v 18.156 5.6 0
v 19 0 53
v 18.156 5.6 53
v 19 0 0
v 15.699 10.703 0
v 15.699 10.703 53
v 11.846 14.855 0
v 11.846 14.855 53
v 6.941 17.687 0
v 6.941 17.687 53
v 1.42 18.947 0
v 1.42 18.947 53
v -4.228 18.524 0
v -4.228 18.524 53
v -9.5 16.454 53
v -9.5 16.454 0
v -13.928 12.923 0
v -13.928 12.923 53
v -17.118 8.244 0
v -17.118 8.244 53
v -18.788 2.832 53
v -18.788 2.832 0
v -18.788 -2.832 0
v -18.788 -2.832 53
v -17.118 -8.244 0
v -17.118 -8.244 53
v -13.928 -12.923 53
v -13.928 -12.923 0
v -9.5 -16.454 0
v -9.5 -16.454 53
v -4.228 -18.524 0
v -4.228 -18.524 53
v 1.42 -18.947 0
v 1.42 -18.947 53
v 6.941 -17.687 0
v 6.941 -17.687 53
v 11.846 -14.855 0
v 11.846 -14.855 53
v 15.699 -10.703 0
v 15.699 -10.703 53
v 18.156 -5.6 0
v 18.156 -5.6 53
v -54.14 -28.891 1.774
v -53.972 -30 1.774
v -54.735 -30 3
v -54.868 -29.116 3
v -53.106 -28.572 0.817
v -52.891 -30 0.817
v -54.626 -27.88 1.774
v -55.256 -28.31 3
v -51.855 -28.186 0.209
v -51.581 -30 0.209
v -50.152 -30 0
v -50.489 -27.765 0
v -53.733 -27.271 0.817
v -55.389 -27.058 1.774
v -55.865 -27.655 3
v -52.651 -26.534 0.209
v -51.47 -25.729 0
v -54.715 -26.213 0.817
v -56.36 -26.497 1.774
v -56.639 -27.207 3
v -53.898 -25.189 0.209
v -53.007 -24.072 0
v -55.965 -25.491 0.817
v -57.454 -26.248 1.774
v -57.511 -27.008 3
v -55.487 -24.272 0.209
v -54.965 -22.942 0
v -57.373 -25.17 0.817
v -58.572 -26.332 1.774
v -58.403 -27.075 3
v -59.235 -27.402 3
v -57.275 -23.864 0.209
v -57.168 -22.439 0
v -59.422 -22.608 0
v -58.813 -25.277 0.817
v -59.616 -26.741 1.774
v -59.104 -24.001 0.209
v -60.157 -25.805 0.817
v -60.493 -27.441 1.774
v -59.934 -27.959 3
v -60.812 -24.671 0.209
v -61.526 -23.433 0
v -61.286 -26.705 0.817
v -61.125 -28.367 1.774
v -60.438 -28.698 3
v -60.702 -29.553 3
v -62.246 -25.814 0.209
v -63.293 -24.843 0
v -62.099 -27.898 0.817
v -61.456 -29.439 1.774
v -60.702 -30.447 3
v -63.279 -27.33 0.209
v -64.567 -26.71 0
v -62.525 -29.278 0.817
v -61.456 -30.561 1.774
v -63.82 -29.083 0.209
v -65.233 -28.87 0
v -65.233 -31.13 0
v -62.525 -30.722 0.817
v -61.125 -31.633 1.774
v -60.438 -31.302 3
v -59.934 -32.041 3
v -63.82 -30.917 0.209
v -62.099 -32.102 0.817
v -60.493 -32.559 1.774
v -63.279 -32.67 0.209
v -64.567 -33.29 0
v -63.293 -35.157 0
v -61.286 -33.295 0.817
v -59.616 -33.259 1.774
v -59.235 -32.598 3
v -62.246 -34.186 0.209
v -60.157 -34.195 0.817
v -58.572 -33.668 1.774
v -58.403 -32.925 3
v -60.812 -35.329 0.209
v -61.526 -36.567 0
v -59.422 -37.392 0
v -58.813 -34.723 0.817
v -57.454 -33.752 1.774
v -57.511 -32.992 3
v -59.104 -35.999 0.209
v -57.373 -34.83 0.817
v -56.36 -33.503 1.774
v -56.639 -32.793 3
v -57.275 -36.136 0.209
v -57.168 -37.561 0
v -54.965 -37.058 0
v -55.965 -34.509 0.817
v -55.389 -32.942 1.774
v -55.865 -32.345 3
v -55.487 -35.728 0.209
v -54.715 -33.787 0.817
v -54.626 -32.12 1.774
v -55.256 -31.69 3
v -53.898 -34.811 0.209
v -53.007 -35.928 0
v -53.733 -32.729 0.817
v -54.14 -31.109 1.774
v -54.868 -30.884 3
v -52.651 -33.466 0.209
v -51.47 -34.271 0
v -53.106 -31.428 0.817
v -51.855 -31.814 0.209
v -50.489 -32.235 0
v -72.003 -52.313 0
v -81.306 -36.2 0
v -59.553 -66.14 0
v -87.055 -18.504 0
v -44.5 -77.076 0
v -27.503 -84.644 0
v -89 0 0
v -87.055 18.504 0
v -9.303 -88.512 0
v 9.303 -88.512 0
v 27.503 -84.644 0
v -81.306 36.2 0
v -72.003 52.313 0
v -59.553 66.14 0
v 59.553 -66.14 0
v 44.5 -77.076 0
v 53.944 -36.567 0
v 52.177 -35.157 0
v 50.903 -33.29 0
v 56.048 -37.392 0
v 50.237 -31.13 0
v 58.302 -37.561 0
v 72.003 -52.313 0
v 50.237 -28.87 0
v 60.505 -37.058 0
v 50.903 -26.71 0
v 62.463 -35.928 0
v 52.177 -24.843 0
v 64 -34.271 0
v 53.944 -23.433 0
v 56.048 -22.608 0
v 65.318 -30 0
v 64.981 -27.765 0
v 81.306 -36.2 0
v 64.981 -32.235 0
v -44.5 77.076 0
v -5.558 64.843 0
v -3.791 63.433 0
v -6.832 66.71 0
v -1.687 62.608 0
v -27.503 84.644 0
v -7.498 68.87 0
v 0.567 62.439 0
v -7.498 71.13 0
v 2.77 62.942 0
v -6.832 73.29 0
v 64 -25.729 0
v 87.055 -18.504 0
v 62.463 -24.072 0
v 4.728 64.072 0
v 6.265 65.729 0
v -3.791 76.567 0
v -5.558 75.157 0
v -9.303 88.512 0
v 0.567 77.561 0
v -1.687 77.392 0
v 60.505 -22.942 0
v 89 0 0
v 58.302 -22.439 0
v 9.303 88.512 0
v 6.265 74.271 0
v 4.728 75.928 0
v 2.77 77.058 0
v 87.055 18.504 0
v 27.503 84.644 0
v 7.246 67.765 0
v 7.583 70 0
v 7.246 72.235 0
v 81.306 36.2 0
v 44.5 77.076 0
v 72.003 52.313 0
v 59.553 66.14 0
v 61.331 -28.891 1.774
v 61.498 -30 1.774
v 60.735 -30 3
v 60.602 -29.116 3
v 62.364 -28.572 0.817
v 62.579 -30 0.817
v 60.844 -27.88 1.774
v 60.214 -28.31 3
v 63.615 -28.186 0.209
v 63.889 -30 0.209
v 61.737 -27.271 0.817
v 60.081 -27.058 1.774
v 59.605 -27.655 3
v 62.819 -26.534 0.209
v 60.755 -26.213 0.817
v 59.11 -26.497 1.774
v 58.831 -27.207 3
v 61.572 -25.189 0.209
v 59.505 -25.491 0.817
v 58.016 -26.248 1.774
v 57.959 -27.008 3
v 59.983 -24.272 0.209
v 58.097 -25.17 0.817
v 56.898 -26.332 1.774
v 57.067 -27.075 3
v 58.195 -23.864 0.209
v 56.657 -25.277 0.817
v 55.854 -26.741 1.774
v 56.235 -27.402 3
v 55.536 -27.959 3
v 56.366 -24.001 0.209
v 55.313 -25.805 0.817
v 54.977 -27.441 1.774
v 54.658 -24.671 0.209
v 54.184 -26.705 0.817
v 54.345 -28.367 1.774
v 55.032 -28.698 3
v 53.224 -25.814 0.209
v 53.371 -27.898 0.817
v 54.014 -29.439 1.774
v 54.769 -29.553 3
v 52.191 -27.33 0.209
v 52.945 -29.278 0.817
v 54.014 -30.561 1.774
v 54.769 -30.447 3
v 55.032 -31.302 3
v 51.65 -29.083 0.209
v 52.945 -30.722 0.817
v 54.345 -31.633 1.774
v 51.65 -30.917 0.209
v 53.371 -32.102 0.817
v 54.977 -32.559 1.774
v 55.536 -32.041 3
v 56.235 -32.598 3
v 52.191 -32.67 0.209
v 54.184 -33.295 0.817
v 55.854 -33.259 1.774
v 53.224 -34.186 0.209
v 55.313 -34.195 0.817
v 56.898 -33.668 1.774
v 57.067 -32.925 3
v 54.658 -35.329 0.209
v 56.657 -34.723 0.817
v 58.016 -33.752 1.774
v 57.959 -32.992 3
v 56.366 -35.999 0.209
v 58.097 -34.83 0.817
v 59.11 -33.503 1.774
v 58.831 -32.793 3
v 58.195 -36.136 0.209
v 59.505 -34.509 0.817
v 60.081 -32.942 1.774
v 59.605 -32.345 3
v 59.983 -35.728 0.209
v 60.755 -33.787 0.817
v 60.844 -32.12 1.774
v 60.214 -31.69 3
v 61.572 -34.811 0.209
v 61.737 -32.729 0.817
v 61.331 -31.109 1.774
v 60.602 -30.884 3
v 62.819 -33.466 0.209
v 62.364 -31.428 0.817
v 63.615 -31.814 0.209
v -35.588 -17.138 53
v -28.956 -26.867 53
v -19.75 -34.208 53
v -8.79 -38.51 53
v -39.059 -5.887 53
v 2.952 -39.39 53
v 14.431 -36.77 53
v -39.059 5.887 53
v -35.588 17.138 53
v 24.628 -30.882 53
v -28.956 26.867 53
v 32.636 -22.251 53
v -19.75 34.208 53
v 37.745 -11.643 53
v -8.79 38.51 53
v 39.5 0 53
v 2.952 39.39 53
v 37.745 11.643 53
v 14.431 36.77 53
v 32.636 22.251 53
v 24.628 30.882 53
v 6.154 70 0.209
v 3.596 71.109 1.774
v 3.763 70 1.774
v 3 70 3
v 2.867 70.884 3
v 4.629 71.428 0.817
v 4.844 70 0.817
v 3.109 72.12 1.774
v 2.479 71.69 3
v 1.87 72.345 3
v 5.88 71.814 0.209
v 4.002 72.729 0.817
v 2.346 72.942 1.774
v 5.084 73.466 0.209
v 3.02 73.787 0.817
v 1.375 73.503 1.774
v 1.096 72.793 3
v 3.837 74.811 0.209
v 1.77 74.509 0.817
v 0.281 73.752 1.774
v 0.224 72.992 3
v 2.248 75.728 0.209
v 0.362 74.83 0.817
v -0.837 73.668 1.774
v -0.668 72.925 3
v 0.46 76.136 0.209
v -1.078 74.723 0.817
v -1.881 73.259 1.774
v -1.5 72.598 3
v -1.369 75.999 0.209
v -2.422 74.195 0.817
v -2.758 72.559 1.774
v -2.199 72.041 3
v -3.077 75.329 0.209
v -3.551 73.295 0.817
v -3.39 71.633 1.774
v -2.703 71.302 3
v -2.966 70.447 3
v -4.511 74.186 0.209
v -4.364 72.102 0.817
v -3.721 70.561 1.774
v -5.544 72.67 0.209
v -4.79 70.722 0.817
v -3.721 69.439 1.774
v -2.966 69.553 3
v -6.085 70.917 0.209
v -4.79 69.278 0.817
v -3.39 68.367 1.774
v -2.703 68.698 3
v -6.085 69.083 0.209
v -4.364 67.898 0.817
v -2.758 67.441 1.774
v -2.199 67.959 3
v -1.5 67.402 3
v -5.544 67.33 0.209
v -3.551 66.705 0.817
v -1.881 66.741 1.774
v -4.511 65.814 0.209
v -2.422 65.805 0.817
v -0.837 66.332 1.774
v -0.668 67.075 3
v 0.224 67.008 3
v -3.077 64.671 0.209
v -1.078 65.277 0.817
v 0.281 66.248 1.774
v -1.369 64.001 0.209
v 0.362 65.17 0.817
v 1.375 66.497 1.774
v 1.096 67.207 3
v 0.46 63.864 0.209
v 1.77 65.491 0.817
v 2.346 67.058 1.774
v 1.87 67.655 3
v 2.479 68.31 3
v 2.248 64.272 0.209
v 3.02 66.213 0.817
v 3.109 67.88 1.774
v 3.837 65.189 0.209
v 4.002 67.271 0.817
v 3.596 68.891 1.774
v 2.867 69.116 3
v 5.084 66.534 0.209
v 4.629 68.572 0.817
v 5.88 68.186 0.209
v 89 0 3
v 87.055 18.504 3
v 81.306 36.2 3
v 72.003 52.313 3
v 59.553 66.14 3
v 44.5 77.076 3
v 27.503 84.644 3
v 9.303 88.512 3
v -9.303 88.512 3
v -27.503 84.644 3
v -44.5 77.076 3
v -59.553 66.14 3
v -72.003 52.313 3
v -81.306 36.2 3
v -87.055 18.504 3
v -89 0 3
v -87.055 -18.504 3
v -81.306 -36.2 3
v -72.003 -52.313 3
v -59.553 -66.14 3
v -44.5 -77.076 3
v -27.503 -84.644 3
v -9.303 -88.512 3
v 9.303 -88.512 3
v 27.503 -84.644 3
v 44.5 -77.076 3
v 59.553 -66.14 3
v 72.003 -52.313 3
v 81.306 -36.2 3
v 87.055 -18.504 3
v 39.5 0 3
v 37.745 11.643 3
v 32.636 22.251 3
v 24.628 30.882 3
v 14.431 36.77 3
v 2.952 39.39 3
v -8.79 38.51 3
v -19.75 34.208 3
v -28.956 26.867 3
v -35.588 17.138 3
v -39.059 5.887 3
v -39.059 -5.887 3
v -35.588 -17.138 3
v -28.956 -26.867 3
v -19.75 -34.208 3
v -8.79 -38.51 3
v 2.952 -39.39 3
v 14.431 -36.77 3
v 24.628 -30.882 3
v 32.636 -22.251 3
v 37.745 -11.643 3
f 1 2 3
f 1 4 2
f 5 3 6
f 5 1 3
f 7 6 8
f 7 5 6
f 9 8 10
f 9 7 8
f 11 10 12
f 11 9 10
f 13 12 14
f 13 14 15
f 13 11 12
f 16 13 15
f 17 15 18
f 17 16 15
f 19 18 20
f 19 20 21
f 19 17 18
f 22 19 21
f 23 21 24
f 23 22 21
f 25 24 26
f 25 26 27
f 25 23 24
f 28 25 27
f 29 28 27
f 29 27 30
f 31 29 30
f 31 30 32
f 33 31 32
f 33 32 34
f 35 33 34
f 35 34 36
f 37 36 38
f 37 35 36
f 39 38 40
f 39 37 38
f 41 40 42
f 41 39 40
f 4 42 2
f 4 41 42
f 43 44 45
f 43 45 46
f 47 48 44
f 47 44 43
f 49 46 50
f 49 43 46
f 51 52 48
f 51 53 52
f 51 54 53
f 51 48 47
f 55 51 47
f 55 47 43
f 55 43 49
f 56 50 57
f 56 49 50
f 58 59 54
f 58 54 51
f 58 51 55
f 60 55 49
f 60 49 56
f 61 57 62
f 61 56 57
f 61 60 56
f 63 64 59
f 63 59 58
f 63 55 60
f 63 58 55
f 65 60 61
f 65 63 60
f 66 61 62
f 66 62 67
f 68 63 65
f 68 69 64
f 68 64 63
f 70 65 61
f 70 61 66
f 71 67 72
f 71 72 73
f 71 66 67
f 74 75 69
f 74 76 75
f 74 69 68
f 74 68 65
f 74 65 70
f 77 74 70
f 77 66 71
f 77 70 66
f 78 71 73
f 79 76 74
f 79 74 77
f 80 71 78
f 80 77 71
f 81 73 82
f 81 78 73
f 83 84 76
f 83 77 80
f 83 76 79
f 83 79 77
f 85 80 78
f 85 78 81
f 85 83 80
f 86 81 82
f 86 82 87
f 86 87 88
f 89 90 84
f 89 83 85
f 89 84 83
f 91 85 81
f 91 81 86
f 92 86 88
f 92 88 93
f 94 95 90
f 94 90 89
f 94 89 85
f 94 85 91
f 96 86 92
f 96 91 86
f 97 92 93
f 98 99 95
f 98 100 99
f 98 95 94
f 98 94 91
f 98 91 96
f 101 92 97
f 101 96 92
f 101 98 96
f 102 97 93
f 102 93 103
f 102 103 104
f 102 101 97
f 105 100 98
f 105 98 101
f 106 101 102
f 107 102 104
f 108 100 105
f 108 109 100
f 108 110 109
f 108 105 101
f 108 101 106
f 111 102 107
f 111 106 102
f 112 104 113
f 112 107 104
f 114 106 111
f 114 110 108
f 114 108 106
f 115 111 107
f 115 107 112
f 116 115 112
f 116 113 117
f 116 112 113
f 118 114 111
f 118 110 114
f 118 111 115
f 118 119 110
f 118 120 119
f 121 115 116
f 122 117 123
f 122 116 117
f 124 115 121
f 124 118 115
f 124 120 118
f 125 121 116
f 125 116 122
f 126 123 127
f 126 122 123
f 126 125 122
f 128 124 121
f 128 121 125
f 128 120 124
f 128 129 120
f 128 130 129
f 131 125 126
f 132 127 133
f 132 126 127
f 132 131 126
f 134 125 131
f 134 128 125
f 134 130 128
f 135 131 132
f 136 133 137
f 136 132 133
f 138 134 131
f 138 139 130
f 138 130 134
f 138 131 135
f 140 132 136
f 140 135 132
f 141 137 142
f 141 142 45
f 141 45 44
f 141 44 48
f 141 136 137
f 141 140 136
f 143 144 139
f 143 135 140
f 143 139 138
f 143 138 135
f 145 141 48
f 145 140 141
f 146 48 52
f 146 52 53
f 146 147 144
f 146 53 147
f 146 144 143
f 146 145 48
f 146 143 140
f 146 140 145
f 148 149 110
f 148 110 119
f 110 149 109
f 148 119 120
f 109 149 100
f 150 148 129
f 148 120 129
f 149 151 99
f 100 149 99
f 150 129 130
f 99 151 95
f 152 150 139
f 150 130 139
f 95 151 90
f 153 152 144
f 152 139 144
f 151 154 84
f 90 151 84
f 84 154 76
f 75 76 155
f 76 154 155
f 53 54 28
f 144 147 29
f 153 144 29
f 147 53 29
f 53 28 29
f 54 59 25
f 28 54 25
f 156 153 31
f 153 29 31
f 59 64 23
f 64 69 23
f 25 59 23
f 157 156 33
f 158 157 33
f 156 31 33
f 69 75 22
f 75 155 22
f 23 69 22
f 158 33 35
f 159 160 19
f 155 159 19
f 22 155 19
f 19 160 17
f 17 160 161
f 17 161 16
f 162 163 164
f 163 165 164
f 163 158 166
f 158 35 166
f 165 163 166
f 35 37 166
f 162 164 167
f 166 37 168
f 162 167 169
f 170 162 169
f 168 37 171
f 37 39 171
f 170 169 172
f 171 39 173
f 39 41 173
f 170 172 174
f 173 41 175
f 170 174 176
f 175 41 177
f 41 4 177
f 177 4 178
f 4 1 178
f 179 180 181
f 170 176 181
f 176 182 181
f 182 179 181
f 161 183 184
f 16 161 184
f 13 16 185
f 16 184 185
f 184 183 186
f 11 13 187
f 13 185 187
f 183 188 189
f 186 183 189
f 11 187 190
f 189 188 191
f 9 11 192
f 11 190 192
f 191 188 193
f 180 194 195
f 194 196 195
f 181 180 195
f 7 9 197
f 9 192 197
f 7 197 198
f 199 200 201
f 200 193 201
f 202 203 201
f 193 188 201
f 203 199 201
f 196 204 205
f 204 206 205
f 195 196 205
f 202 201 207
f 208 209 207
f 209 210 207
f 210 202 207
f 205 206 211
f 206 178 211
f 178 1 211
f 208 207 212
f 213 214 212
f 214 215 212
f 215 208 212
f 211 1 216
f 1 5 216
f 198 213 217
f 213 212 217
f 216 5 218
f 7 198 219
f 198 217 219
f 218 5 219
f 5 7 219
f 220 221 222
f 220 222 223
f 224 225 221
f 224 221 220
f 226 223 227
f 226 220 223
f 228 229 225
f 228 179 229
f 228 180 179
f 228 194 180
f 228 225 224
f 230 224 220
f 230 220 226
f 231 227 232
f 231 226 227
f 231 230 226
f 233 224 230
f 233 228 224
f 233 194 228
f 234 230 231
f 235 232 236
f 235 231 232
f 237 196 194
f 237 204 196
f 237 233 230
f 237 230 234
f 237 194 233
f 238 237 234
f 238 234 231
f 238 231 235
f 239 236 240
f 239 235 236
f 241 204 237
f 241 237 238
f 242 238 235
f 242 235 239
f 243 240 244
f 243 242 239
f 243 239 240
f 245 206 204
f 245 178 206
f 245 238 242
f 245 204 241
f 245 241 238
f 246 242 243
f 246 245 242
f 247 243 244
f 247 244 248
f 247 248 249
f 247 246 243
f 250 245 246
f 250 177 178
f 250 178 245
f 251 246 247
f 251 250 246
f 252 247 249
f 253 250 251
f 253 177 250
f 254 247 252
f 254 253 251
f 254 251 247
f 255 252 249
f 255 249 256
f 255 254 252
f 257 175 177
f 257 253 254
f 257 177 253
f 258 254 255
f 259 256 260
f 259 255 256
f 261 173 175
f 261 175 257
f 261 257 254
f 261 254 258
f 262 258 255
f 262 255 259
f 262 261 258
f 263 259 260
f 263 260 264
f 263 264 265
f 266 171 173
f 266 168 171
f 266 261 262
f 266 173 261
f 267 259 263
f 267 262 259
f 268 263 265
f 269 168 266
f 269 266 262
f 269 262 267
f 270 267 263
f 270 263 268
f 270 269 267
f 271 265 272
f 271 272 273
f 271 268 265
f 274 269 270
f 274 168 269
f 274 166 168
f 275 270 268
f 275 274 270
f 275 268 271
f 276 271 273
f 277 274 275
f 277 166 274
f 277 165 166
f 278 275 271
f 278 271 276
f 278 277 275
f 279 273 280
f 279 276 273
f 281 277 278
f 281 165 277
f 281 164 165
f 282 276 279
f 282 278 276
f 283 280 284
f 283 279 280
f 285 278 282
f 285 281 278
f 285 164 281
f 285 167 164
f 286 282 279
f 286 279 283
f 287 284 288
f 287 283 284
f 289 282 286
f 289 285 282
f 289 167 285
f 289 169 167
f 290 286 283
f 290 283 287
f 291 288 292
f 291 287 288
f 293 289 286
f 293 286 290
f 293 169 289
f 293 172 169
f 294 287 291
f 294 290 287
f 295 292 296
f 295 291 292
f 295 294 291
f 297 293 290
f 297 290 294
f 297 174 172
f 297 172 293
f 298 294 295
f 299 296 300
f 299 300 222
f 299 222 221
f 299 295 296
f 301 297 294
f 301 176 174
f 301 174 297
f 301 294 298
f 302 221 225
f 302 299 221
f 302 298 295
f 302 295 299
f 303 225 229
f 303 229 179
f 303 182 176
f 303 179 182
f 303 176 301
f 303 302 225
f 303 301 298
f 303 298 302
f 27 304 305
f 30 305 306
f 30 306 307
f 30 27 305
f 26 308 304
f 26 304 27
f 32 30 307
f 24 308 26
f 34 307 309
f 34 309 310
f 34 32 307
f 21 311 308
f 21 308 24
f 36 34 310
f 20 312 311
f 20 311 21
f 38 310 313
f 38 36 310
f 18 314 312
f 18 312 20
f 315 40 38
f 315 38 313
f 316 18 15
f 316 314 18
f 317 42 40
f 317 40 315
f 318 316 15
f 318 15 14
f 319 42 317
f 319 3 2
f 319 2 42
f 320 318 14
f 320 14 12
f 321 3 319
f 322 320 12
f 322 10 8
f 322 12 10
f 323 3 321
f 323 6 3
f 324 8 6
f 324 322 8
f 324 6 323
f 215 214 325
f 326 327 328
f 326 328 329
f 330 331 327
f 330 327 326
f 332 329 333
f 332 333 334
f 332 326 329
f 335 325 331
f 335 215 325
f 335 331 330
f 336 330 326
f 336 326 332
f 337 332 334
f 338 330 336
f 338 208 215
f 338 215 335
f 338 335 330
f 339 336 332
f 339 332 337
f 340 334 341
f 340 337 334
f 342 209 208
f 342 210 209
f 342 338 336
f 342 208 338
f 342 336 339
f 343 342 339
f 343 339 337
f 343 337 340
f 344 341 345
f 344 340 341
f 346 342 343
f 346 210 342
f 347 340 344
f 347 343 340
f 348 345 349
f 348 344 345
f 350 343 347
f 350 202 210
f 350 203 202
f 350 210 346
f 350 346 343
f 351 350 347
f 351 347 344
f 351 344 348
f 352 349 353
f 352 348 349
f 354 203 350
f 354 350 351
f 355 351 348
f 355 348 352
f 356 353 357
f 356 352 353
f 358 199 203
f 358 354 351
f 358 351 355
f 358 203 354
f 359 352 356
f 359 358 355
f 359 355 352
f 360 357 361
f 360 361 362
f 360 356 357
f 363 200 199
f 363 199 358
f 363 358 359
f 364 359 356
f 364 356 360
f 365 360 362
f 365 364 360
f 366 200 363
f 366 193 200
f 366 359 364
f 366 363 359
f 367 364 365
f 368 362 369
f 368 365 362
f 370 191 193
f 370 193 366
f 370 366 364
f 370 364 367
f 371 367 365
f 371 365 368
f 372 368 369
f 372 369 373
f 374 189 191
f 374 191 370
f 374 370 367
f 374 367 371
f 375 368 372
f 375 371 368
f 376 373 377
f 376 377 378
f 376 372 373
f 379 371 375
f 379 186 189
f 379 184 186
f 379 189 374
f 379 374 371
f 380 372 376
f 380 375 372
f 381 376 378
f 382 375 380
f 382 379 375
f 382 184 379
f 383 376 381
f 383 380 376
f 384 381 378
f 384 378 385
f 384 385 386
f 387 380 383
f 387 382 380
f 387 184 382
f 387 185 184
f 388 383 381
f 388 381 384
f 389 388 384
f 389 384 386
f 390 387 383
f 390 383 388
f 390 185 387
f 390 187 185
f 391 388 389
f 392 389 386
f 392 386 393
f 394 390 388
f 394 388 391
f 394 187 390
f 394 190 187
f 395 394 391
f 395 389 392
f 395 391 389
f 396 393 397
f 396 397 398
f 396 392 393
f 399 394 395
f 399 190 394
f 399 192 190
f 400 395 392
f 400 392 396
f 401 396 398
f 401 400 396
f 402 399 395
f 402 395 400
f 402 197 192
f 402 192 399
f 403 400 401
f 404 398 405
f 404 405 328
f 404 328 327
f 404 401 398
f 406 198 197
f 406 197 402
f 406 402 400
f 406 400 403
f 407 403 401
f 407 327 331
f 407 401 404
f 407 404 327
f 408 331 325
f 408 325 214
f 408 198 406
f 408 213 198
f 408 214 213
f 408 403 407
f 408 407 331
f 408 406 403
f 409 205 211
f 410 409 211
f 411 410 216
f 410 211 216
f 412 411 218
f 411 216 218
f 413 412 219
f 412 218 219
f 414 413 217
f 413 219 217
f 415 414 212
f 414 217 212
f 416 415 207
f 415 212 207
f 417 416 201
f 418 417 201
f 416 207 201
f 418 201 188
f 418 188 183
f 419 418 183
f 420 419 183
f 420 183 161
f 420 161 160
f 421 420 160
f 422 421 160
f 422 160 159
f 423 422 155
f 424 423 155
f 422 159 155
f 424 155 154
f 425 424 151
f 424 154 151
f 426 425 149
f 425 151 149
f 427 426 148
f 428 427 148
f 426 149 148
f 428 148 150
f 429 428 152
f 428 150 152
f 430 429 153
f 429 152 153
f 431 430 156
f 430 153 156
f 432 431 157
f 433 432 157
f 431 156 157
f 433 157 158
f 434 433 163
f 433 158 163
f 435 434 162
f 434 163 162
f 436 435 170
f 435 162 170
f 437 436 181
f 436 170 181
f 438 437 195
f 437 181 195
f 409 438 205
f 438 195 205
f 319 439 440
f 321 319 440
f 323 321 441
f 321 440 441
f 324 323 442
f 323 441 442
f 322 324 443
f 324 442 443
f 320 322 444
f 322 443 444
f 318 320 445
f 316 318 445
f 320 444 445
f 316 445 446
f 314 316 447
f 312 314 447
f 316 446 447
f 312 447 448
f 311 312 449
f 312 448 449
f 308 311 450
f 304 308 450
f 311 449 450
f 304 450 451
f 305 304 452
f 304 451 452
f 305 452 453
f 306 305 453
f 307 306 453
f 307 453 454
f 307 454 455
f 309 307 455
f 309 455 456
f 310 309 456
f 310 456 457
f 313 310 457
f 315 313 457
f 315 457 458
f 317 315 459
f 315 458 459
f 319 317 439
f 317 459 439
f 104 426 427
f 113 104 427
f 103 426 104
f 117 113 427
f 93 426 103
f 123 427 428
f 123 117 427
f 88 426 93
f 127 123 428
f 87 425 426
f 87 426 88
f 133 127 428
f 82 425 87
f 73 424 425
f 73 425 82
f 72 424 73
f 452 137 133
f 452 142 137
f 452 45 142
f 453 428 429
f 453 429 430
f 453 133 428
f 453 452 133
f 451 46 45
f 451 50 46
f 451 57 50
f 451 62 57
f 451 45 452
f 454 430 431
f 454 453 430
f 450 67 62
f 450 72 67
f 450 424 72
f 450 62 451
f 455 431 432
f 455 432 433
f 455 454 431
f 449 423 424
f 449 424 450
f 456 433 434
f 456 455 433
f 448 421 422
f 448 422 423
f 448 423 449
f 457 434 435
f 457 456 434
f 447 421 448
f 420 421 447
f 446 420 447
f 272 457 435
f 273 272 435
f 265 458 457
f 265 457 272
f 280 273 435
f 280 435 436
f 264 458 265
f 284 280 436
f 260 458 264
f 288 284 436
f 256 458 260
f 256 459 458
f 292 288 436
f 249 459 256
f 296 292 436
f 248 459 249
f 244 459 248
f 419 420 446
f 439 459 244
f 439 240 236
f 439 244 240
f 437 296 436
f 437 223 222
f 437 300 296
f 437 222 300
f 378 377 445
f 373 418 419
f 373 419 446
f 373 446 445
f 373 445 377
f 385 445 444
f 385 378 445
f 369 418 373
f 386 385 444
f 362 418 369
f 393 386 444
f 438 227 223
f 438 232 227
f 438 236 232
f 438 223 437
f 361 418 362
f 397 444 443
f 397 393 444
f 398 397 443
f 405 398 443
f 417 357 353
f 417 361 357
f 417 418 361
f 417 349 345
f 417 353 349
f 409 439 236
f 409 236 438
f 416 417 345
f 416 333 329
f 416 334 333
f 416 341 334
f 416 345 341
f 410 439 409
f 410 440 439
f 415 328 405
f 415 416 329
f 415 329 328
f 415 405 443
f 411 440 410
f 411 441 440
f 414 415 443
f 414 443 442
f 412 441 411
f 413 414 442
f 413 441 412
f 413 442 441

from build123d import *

# Parameters (mm, degrees)
F0_R     = 89
F0_R_2   = 3
F0_R_3   = 19
F1_DEPTH = 3
F2_R     = 39.5
F2_R_2   = 19
F3_DEPTH = 50


# Not quite as in the source:
# - a fillet or chamfer that OpenCascade refuses, or shapes differently, is made with other operations: its cross-section is extruded or revolved along the edge and cut away or added


with BuildPart() as f1:
    # F0 (on Top) → F1 (new body)
    with BuildSketch(Plane.XY):
        Circle(F0_R)
        with Locations((-57.735026919, -30)):
            Circle(F0_R_2, mode=Mode.SUBTRACT)
        with Locations((57.735026919, -30)):
            Circle(F0_R_2, mode=Mode.SUBTRACT)
        Circle(F0_R_3, mode=Mode.SUBTRACT)
        with Locations((0, 70)):
            Circle(F0_R_2, mode=Mode.SUBTRACT)
    extrude(amount=F1_DEPTH)

    # F2 (on face) → F3 (join)
    with BuildSketch(Plane.XY.offset(3)):
        Circle(F2_R)
        Circle(F2_R_2, mode=Mode.SUBTRACT)
    extrude(amount=F3_DEPTH)

    # F4: fillet of radius 5 on 3 edges, made by hand

    # F4_s1 → F4_t2 (revolve, cut)
    with BuildSketch(Plane.XZ.offset(30)):
        with BuildLine():
            ThreePointArc((60.735026919, 3), (62.5789898264, 0.8166998673), (65.3176026139, 0))
            Line((65.3176026139, 0), (60.735026919, 0))
            Line((60.735026919, 0), (60.735026919, 3))
        make_face()
    revolve(axis=Axis((57.735026919, -30, 0), (0, 0, 1)), mode=Mode.SUBTRACT)

    # F4_s3 → F4_t4 (revolve, cut)
    with BuildSketch(Plane.XZ.offset(-70)):
        with BuildLine():
            ThreePointArc((3, 3), (4.8439629074, 0.8166998673), (7.582575695, 0))
            Line((7.582575695, 0), (3, 0))
            Line((3, 0), (3, 3))
        make_face()
    revolve(axis=Axis((0, 70, 0), (0, 0, 1)), mode=Mode.SUBTRACT)

    # F4_s5 → F4_t6 (revolve, cut)
    with BuildSketch(Plane.XZ.offset(30)):
        with BuildLine():
            ThreePointArc((-54.735026919, 3), (-52.8910640115, 0.8166998673), (-50.152451224, 0))
            Line((-50.152451224, 0), (-54.735026919, 0))
            Line((-54.735026919, 0), (-54.735026919, 3))
        make_face()
    revolve(axis=Axis((-57.735026919, -30, 0), (0, 0, 1)), mode=Mode.SUBTRACT)


solid = f1.part
